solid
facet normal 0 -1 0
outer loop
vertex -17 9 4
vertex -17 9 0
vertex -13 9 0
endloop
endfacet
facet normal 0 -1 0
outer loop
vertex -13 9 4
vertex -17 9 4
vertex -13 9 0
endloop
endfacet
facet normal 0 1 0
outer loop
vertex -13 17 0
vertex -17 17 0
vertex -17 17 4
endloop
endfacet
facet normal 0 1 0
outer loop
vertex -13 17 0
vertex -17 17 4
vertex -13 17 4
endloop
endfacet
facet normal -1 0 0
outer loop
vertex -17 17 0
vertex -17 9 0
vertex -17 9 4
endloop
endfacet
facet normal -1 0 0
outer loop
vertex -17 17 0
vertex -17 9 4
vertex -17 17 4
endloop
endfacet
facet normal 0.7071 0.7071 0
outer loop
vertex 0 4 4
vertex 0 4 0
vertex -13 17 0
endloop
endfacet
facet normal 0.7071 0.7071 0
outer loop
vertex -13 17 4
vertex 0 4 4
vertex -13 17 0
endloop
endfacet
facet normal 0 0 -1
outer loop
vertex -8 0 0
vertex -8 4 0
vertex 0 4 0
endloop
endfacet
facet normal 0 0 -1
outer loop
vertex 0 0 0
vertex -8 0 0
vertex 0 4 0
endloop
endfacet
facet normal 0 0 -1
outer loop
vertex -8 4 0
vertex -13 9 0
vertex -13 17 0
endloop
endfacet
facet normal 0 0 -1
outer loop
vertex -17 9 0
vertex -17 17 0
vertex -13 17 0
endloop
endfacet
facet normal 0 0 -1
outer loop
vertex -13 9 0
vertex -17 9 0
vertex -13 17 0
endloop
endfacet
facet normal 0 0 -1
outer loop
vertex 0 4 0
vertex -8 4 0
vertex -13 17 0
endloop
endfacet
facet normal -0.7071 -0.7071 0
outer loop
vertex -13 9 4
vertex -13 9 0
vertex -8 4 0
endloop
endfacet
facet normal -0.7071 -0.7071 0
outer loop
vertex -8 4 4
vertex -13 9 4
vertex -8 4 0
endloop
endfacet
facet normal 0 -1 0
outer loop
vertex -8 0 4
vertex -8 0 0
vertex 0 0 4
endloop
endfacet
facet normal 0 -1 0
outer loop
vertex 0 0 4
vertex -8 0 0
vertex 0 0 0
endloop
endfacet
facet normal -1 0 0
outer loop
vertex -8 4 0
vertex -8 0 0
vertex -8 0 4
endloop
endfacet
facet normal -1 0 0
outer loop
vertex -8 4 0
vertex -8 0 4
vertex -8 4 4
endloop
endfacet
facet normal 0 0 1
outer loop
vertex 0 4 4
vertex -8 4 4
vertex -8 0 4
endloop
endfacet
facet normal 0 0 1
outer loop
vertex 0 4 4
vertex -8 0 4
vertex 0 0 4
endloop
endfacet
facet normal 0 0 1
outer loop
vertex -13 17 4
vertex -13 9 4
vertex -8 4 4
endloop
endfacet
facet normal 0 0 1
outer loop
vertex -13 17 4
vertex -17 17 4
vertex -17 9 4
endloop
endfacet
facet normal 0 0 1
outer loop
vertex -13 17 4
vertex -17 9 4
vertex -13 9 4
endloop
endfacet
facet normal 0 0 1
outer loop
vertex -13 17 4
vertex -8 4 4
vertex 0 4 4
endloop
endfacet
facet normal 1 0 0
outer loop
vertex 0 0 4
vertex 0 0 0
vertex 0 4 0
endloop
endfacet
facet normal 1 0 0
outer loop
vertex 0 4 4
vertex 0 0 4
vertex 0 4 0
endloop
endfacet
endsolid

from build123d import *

# Parameters (mm, degrees)
SKETCH1_W           = 8
SKETCH1_H           = 4
SKETCH1_W_2         = 4
SKETCH1_H_2         = 8
BOSS_EXTRUDE1_DEPTH = 4


with BuildPart() as part:
    # Sketch1 → Boss-Extrude1 (new body)
    with BuildSketch(Plane.XY):
        Polygon((-13, 9), (-8, 4), (0, 4), (-5, 9), align=None)
        with Locations((-4, 2)):
            Rectangle(SKETCH1_W, SKETCH1_H)
        Polygon((-13, 17), (-13, 9), (-5, 9), align=None)
        with Locations((-15, 13)):
            Rectangle(SKETCH1_W_2, SKETCH1_H_2)
    extrude(amount=BOSS_EXTRUDE1_DEPTH)


solid = part.part
